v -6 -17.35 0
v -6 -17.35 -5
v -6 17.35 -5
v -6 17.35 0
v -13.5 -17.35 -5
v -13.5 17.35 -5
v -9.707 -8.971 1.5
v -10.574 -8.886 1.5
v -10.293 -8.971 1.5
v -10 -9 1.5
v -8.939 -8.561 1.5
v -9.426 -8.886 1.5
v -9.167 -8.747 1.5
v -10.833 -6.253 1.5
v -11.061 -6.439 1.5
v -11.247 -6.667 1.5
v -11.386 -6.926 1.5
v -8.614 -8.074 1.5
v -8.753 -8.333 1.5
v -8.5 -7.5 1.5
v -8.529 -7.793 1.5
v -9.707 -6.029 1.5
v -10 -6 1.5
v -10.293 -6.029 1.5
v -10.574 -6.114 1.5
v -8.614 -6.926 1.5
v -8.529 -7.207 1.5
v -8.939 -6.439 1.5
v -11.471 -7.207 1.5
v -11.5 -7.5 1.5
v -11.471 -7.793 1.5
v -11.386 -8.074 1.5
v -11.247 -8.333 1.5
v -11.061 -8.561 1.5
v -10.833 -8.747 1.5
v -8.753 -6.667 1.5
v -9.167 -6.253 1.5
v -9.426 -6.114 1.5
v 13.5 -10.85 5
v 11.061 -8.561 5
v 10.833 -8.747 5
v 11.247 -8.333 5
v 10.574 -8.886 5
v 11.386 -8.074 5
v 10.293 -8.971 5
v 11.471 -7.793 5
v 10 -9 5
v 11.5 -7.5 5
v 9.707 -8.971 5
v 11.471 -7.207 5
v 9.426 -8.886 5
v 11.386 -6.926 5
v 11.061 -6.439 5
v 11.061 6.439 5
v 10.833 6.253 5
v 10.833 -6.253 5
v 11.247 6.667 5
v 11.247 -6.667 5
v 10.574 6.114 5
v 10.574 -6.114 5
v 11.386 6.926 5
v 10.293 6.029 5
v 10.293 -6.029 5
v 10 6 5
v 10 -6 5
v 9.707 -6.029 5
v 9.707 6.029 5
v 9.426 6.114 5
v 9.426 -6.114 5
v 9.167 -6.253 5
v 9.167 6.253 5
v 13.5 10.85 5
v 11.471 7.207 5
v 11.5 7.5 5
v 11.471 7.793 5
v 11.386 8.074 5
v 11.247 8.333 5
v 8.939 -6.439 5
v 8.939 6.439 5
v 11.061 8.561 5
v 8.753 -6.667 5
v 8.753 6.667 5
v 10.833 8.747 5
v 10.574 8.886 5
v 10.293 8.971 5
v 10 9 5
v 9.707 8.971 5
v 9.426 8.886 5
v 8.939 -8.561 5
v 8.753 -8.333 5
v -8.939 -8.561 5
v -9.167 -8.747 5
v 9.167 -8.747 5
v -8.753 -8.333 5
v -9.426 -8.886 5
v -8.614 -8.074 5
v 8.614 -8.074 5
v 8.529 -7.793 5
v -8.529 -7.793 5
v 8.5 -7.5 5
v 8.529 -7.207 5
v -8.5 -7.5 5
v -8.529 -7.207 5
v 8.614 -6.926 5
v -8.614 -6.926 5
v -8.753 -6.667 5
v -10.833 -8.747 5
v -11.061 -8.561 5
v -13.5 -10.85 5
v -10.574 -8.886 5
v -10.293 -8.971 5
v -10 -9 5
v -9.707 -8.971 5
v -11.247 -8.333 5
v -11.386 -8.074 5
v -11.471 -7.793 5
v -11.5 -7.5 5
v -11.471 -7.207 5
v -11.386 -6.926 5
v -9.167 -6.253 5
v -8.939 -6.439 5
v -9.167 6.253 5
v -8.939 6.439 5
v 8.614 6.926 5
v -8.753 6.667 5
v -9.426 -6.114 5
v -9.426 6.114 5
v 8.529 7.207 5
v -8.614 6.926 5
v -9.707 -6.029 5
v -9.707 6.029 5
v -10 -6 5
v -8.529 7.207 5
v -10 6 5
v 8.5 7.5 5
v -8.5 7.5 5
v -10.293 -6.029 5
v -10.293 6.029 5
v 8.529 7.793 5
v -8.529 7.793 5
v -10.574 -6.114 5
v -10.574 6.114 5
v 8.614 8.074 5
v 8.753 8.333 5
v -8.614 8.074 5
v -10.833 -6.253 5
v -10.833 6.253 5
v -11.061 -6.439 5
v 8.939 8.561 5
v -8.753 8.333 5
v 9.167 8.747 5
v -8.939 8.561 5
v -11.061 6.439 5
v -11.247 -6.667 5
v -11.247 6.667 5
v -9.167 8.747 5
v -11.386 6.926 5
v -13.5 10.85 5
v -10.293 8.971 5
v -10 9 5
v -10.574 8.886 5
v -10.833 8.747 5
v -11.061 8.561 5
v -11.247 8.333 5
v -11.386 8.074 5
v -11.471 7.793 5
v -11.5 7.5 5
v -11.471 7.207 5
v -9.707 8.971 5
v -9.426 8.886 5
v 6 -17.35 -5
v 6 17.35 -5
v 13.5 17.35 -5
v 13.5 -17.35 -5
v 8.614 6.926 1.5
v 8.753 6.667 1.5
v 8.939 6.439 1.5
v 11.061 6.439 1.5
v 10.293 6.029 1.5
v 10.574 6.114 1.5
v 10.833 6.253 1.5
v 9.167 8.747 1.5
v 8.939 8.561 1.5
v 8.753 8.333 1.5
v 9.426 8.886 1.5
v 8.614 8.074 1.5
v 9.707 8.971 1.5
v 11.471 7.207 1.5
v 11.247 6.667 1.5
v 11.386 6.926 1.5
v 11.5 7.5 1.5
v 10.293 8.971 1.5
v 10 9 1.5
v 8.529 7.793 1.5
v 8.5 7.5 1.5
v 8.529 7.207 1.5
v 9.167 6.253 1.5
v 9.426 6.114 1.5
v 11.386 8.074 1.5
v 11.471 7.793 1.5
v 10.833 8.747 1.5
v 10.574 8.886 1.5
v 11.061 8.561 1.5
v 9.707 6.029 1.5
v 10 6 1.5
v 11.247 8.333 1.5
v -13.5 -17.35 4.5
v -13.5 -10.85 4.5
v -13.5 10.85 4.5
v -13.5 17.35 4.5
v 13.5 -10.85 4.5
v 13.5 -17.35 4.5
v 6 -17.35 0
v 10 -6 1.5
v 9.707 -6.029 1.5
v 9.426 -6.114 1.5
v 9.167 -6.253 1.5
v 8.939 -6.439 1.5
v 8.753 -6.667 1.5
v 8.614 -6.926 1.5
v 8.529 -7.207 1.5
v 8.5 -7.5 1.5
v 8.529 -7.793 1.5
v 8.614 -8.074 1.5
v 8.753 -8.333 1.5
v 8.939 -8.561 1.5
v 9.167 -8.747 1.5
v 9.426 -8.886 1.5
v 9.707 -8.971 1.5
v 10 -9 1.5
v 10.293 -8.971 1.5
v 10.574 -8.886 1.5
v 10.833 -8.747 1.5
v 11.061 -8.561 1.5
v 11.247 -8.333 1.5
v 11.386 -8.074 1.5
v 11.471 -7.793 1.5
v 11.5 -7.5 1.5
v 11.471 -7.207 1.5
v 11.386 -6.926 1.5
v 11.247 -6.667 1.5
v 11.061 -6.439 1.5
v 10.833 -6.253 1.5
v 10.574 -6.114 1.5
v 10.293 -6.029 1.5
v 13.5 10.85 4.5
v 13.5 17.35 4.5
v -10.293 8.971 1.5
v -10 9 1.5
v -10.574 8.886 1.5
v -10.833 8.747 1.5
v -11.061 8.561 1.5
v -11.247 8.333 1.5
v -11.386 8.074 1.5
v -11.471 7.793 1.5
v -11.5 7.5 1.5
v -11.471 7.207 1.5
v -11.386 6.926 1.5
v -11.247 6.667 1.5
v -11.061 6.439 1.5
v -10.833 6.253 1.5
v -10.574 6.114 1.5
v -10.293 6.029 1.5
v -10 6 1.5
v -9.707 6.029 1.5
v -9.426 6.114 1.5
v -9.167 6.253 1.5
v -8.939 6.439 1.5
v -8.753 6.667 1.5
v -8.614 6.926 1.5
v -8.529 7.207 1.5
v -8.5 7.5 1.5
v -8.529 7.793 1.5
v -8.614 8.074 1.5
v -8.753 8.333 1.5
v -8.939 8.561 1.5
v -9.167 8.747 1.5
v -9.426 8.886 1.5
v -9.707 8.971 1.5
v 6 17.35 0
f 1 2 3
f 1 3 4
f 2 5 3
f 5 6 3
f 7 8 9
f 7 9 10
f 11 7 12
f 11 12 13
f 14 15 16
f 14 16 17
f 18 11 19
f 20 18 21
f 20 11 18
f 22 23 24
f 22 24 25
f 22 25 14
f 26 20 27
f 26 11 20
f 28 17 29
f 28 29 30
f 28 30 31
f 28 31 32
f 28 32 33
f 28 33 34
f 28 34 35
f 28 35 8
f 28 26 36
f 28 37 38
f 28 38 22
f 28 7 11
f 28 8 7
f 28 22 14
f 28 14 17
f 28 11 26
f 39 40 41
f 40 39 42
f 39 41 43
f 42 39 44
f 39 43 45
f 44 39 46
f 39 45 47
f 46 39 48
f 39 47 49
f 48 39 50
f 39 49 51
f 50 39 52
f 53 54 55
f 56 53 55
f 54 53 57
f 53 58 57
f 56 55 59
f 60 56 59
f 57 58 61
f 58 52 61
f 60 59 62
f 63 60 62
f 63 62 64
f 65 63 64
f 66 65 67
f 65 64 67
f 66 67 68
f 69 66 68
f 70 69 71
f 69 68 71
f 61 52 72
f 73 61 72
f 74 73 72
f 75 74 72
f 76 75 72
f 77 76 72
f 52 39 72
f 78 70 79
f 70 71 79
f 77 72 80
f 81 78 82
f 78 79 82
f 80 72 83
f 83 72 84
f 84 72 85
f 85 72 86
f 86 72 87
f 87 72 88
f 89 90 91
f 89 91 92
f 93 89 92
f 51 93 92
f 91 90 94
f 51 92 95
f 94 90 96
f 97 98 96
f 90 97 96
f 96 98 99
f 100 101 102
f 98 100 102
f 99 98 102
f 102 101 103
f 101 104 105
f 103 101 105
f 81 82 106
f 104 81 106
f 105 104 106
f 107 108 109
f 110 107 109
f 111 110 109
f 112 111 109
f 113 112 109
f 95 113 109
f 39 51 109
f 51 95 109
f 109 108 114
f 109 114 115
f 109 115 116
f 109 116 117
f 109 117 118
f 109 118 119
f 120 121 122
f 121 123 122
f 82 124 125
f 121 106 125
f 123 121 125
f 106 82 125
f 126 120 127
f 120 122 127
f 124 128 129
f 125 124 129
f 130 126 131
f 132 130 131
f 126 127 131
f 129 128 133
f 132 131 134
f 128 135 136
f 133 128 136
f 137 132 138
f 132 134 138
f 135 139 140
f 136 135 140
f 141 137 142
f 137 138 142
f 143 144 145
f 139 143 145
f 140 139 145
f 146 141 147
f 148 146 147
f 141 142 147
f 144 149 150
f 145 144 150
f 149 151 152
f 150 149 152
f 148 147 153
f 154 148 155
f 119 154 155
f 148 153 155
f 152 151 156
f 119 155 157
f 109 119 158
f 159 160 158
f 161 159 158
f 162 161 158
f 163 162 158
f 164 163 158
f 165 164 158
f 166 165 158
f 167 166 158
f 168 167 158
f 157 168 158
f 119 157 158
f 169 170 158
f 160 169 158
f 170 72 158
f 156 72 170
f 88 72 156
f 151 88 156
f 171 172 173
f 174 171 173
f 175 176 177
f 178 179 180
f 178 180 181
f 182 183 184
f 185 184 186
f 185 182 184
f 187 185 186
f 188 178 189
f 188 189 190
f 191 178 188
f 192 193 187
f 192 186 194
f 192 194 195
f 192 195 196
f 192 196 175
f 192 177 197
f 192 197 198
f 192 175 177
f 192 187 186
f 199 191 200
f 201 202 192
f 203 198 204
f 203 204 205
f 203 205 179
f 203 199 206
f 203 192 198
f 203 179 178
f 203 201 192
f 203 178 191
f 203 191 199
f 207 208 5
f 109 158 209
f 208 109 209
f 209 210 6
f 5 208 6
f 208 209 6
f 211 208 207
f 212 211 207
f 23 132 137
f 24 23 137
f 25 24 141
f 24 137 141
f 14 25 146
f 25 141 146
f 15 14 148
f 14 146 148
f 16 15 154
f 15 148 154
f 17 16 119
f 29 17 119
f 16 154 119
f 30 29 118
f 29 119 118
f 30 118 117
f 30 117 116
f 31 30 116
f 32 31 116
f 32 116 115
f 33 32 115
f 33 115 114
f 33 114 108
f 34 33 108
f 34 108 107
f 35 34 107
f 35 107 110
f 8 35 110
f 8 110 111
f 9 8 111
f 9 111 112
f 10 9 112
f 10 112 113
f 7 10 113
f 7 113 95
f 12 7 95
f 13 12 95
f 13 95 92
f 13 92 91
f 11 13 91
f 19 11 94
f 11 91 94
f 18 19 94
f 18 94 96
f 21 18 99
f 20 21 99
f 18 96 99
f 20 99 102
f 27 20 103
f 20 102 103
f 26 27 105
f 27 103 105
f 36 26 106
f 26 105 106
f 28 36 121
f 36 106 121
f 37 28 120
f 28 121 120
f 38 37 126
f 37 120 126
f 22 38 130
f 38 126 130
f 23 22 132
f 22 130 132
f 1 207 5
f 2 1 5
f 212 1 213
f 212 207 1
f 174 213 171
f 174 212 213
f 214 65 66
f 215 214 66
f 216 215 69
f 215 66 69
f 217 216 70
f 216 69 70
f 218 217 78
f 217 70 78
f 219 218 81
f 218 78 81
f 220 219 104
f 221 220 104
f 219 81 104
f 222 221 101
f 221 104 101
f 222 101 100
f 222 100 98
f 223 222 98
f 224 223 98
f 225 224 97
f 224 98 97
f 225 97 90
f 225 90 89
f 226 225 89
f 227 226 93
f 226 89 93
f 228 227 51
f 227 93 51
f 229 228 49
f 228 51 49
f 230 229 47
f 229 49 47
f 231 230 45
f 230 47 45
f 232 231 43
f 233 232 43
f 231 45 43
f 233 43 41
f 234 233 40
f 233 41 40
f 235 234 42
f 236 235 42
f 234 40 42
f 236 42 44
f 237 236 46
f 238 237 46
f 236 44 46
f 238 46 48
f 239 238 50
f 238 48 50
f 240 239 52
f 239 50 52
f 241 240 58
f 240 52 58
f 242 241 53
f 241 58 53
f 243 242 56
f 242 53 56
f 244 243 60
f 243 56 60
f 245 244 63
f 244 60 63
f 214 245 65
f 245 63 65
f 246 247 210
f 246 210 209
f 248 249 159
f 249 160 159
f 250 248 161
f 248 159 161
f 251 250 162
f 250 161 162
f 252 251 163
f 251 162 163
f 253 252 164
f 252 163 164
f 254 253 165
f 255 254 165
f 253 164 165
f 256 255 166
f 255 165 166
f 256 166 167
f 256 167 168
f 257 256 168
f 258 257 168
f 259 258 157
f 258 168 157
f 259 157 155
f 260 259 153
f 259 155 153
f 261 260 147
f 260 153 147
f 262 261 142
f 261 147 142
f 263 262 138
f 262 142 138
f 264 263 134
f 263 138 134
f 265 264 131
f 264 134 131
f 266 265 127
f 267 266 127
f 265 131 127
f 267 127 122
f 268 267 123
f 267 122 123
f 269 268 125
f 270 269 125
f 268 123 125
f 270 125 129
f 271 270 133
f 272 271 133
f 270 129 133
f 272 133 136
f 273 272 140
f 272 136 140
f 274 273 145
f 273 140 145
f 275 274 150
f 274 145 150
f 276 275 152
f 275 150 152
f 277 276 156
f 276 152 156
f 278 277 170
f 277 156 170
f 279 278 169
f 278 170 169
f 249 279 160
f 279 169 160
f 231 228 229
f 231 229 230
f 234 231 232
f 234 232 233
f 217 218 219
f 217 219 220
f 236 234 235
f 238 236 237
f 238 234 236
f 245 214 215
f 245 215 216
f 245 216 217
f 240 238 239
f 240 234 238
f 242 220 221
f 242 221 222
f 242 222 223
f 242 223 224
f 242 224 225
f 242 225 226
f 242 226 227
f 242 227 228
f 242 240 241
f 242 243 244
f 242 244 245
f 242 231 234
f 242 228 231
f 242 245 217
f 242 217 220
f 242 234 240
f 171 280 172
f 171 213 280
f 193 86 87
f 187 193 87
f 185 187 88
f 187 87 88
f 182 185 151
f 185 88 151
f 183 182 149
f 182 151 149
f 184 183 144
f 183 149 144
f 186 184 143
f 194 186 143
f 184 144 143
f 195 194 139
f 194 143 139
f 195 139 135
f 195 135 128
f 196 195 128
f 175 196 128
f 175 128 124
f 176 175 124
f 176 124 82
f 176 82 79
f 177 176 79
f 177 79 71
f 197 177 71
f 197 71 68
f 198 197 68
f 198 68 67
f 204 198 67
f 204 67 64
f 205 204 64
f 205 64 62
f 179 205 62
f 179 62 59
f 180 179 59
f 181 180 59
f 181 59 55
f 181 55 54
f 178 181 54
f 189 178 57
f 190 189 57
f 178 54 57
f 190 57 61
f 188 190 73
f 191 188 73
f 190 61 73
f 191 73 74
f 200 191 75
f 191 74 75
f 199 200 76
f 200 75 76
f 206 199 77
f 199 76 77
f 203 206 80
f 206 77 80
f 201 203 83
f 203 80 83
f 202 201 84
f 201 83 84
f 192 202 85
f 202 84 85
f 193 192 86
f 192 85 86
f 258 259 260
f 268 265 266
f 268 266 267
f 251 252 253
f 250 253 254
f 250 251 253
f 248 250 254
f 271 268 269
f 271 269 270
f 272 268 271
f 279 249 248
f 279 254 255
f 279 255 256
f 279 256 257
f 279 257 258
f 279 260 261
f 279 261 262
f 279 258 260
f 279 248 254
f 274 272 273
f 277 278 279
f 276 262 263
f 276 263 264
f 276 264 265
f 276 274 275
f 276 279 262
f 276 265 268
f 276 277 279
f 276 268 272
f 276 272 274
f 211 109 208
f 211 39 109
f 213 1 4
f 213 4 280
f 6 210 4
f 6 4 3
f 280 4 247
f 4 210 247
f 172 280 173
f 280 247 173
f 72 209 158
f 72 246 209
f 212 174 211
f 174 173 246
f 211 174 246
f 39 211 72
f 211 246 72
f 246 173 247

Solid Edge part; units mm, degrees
sketch "Sketch1" plane through (0, 0, 0) normal (0, -1, 0) x (1, 0, 0)
  line L0 (-13.5, -5) -> (13.5, -5)
  line L1 (13.5, -5) -> (13.5, 5)
  line L2 (13.5, 5) -> (-13.5, 5)
  line L3 (-13.5, 5) -> (-13.5, -5)
  dimension "D1" = 27
  dimension "D2" = 10
extrude "Protrusion1" add sketch "Sketch1" along normal mid plane 34.7
sketch "Sketch2" plane through (13.5, 0, 0) normal (1, 0, 0) x (0, 1, 0)
  line L0 (-17.35, 5) -> (-10.85, 5)
  line L1 (-10.85, 5) -> (-10.85, 4.5)
  line L2 (-10.85, 4.5) -> (-17.35, 4.5)
  line L3 (-17.35, 4.5) -> (-17.35, 5)
  dimension "D1" = 10.85
  dimension "D2" = 0.5
extrude "Cutout1" cut sketch "Sketch2" against normal through all
mirror "Mirror1" about plane through (0, 0, 0) normal (0, -1, 0) of "Cutout1"
sketch "Sketch3" plane through (0, -17.35, -0.25) normal (0, -1, 0) x (1, 0, 0)
  line L0 (0, -4.75) -> (-6, -4.75)
  line L1 (-6, -4.75) -> (-6, 0.25)
  line L2 (-6, 0.25) -> (0, 0.25)
  line L3 (0, 0.25) -> (0, -4.75)
  dimension "D1" = 5
  dimension "D2" = 6
extrude "Cutout3" cut sketch "Sketch3" against normal through all
mirror "Mirror2" about plane through (0, 0, 0) normal (-1, 0, 0) of "Cutout3"
sketch "Sketch4" plane through (0, 0, 5) normal (0, 0, 1) x (0, 1, 0)
  circle A0 centre (-7.5, 10) radius 1.5
  circle A1 centre (7.5, 10) radius 1.5
  circle A2 centre (7.5, -10) radius 1.5
  circle A3 centre (-7.5, -10) radius 1.5
  dimension "D1" = 3
  dimension "D2" = 20
  dimension "D3" = 15
extrude "ExtrudedCutout_5" cut sketch "Sketch4" against normal blind 3.5
